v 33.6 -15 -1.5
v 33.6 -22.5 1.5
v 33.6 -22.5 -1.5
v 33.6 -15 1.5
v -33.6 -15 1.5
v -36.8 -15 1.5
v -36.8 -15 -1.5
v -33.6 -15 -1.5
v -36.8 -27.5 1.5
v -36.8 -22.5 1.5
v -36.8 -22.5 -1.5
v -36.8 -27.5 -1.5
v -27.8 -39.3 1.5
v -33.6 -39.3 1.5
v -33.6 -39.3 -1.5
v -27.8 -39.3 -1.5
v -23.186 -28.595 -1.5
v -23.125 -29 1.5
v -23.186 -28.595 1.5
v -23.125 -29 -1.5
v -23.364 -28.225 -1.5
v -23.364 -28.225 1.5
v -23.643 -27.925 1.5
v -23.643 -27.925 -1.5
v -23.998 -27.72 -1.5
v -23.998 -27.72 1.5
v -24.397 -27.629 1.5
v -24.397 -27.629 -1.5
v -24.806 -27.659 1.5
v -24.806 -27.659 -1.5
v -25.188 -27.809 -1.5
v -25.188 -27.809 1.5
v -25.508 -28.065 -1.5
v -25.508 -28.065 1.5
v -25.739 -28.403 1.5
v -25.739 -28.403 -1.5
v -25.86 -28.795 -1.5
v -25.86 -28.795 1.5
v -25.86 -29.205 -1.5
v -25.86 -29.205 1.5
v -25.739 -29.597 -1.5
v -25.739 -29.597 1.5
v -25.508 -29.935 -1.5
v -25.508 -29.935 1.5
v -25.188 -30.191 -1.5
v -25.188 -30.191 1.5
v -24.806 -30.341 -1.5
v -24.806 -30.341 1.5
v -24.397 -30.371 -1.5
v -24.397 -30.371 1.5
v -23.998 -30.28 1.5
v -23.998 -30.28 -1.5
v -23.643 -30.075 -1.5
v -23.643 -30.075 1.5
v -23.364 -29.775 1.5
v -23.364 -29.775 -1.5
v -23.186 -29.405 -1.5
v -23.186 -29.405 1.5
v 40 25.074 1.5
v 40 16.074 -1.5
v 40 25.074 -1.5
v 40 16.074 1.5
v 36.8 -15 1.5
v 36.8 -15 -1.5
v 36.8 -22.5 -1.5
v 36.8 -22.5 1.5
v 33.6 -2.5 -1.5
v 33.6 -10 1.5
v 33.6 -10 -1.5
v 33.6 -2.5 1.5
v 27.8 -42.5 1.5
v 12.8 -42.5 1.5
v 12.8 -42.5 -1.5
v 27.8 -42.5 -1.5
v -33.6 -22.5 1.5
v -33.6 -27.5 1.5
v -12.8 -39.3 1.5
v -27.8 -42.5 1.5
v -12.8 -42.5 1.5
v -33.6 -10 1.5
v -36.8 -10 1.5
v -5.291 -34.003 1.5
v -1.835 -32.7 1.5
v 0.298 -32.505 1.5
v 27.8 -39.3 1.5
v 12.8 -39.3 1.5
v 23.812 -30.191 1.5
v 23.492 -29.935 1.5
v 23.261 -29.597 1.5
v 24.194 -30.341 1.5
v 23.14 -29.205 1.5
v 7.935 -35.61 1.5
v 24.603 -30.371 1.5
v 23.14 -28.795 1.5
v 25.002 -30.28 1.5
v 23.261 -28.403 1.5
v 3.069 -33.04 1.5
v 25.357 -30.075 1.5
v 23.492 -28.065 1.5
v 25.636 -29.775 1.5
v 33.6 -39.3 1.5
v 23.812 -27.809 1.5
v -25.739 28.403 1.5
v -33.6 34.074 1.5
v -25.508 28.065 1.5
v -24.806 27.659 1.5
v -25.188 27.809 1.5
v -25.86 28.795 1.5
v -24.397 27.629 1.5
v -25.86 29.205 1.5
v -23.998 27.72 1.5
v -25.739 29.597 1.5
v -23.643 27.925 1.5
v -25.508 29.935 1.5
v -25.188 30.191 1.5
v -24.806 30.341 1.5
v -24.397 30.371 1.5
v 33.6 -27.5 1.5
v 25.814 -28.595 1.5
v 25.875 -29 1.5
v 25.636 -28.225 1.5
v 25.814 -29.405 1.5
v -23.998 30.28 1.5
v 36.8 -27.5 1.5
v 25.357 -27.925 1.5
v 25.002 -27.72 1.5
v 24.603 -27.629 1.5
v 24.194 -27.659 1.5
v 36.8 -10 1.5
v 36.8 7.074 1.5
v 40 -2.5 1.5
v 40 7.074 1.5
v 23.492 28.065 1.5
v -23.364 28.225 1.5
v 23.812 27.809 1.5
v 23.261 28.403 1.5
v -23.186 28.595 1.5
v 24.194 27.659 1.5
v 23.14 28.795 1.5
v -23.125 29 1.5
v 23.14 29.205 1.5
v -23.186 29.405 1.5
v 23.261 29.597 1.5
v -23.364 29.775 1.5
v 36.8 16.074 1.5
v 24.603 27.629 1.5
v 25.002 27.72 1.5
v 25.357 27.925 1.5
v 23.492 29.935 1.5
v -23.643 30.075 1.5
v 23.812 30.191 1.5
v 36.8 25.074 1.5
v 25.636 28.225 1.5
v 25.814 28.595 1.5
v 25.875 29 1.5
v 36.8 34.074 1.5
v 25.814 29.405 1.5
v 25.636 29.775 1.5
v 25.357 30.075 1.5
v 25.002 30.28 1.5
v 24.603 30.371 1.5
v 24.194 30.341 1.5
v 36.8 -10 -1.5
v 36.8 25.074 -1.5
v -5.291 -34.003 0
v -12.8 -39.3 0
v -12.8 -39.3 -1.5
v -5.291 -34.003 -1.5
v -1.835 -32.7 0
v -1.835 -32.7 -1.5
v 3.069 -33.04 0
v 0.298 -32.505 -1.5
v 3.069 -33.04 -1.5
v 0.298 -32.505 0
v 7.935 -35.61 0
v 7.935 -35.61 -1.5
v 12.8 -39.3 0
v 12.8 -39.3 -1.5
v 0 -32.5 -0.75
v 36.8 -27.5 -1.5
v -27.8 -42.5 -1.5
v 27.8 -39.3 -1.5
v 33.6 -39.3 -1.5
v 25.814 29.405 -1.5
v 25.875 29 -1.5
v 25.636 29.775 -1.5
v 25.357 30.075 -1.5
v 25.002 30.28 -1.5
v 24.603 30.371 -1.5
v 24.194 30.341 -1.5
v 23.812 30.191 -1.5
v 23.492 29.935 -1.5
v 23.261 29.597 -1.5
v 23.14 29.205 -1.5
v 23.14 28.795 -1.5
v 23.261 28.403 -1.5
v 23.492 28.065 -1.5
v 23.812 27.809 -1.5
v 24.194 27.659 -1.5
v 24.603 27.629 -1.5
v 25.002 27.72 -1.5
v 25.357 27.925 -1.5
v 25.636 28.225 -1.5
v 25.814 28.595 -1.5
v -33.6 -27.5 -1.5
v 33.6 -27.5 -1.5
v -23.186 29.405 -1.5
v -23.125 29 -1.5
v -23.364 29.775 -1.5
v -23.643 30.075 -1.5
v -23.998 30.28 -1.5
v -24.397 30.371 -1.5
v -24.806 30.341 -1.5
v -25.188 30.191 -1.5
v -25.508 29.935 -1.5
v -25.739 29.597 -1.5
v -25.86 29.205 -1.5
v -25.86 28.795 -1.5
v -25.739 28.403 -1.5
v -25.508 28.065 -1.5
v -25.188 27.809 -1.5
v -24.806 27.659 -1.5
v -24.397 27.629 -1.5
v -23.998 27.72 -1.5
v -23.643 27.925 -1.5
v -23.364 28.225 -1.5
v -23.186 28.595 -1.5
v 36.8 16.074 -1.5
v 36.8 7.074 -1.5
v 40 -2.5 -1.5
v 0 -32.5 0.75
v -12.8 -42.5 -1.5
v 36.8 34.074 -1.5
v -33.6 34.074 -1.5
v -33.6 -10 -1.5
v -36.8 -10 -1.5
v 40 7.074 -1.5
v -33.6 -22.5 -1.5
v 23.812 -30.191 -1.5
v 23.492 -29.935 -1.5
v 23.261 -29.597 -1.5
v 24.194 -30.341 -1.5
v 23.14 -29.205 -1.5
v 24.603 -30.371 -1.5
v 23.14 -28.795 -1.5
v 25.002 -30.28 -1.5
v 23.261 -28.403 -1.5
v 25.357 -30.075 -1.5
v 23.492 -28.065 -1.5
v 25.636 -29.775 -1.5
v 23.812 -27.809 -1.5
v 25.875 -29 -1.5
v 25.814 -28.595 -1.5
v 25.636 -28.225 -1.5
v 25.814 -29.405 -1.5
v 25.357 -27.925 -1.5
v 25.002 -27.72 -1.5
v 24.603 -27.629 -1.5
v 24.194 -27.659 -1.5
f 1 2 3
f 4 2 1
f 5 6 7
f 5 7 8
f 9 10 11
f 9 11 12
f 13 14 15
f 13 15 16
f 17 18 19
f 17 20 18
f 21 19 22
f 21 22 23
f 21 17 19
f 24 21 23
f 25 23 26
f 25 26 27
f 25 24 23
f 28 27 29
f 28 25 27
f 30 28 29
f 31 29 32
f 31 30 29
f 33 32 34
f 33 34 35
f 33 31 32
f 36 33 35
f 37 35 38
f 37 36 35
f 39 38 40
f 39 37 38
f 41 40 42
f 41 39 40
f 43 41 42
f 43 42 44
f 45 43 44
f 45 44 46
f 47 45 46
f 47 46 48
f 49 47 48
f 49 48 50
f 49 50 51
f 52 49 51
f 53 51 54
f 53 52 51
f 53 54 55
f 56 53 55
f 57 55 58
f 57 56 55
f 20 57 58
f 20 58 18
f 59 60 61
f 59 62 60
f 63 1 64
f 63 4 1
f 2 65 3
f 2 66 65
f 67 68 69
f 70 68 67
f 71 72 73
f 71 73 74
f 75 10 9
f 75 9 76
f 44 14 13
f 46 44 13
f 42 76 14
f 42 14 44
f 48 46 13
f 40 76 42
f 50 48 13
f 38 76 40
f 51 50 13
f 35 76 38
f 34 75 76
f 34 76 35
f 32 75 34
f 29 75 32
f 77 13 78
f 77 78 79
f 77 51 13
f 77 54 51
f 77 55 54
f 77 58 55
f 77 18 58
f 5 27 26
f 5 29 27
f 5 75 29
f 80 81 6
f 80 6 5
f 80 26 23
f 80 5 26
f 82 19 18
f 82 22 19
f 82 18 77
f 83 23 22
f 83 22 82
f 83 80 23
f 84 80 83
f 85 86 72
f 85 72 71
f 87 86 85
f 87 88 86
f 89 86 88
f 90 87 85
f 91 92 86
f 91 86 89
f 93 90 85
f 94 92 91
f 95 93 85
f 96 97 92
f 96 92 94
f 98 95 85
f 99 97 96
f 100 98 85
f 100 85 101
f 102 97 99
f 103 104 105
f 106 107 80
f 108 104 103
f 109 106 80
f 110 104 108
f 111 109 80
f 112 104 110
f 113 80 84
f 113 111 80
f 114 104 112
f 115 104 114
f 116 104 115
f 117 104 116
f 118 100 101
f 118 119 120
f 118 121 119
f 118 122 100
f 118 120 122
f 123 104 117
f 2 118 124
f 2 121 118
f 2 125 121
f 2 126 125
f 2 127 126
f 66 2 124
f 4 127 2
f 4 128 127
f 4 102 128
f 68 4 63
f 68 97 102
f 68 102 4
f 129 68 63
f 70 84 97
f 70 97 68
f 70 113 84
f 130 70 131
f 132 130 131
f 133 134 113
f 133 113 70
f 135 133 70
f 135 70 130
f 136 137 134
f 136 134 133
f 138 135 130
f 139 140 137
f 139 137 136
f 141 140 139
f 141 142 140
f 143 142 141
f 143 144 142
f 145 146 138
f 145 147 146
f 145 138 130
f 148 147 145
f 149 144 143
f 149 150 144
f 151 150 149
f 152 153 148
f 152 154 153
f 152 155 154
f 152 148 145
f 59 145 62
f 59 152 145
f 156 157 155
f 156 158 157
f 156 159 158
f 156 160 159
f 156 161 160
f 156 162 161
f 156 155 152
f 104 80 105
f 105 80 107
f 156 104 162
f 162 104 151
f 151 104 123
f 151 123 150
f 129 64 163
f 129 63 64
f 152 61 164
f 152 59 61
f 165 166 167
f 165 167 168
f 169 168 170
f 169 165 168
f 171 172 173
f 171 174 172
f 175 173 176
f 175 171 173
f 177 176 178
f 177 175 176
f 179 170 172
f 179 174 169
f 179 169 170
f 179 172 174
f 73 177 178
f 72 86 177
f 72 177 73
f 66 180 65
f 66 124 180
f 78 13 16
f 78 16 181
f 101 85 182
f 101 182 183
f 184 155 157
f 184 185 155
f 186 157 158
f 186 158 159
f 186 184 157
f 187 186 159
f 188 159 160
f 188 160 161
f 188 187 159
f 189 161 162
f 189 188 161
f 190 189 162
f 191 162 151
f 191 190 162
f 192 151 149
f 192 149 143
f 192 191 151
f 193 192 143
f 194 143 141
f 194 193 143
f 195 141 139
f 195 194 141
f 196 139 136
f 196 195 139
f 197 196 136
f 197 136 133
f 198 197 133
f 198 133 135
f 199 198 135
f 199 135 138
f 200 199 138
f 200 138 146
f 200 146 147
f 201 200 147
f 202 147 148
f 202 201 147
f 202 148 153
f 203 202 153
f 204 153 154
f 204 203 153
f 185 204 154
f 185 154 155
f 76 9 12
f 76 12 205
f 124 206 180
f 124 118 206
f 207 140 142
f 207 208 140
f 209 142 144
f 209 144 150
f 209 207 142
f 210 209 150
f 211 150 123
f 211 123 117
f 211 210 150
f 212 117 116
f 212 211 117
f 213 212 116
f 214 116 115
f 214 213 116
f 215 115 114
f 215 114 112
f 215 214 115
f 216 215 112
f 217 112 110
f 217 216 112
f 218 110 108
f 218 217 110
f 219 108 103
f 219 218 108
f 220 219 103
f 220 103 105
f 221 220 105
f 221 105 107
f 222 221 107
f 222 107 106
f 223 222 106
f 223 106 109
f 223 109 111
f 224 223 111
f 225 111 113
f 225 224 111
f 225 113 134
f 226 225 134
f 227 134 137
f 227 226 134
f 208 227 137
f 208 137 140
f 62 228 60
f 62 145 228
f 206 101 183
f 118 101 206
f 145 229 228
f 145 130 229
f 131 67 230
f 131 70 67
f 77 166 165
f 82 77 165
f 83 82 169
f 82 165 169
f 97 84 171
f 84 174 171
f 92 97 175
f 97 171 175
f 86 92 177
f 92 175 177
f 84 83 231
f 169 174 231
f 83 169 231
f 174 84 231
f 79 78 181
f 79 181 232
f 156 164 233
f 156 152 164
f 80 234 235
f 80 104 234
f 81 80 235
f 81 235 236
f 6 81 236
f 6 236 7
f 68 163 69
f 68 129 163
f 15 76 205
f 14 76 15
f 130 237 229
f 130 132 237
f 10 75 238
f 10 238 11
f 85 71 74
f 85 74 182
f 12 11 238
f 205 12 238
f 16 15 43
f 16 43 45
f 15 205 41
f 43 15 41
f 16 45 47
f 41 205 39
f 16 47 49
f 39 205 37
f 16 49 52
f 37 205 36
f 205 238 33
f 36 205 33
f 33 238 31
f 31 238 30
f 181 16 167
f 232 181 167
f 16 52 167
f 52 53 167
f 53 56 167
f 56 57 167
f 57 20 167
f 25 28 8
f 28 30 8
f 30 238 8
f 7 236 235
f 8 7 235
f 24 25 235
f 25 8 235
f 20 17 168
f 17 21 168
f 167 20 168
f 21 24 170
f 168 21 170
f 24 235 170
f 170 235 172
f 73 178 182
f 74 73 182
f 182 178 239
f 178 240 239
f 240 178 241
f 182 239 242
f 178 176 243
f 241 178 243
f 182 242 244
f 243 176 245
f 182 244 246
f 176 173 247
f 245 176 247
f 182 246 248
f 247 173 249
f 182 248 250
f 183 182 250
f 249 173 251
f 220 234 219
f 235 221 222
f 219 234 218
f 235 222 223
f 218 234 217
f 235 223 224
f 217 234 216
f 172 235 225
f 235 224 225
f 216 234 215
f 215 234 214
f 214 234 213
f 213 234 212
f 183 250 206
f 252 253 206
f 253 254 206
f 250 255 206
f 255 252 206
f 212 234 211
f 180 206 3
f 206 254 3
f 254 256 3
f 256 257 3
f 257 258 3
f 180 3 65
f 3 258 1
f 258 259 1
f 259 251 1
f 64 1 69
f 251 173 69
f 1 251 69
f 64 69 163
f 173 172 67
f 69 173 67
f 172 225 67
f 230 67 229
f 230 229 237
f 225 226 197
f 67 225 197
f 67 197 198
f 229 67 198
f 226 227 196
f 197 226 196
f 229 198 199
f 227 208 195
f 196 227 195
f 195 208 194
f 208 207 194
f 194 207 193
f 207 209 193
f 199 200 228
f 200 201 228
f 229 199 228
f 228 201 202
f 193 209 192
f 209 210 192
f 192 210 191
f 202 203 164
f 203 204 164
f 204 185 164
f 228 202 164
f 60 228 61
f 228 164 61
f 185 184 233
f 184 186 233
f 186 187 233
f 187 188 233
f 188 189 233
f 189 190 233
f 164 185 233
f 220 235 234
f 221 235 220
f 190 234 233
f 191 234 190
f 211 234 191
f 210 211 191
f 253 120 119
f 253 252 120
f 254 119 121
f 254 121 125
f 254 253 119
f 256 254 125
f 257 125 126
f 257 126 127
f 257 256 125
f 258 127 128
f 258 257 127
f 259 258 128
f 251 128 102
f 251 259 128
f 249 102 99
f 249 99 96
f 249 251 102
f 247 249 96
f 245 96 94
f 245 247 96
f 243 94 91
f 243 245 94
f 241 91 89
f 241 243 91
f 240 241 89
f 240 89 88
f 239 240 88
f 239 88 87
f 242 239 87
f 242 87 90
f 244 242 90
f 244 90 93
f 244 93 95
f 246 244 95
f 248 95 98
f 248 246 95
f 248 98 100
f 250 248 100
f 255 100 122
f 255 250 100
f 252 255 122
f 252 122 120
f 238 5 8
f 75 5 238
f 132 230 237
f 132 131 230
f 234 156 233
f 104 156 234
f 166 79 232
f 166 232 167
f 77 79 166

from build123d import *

# Parameters (mm, degrees)
F0_R     = 1.375
F1_DEPTH = 1.5


with BuildPart() as f1:
    # F0 (on Top) → F1 (new body, symmetric)
    with BuildSketch(Plane.XY):
        with BuildLine():
            Line((33.6, 34.073957), (27.8, 34.073957))
            Line((27.8, 34.073957), (-27.8, 34.073957))
            Line((-27.8, 34.073957), (-33.6, 34.073957))
            Line((-33.6, 34.073957), (-33.6, -10))
            Line((-33.6, -10), (-36.8, -10))
            Line((-36.8, -10), (-36.8, -15))
            Line((-36.8, -15), (-33.6, -15))
            Line((-33.6, -15), (-33.6, -22.5))
            Line((-33.6, -22.5), (-36.8, -22.5))
            Line((-36.8, -22.5), (-36.8, -27.5))
            Line((-36.8, -27.5), (-33.6, -27.5))
            Line((-33.6, -27.5), (-33.6, -39.3))
            Line((-33.6, -39.3), (-27.8, -39.3))
            Line((-27.8, -39.3), (-27.8, -42.5))
            Line((-27.8, -42.5), (-12.8, -42.5))
            Line((-12.8, -42.5), (-12.8, -39.3))
            add(Edge.make_bspline(
                [(-12.8, -39.3), (-8.533333, -35.9), (0, -29.1), (8.533333, -35.9), (12.8, -39.3)],
                knots=[0, 0, 0, 0, 14.494137, 28.988273, 28.988273, 28.988273, 28.988273], degree=3))
            Line((12.8, -39.3), (12.8, -42.5))
            Line((12.8, -42.5), (27.8, -42.5))
            Line((27.8, -42.5), (27.8, -39.3))
            Line((27.8, -39.3), (33.6, -39.3))
            Line((33.6, -39.3), (33.6, -27.5))
            Line((33.6, -27.5), (36.8, -27.5))
            Line((36.8, -27.5), (36.8, -22.5))
            Line((36.8, -22.5), (33.6, -22.5))
            Line((33.6, -22.5), (33.6, -15))
            Line((33.6, -15), (36.8, -15))
            Line((36.8, -15), (36.8, -10))
            Line((36.8, -10), (33.6, -10))
            Line((33.6, -10), (33.6, -2.5))
            Line((33.6, -2.5), (36.8, -2.5))
            Line((36.8, -2.5), (40, -2.5))
            Line((40, -2.5), (40, 7.073957))
            Line((40, 7.073957), (36.8, 7.073957))
            Line((36.8, 7.073957), (36.8, 16.073957))
            Line((36.8, 16.073957), (40, 16.073957))
            Line((40, 16.073957), (40, 25.073957))
            Line((40, 25.073957), (36.8, 25.073957))
            Line((36.8, 25.073957), (36.8, 34.073957))
            Line((36.8, 34.073957), (33.6, 34.073957))
        make_face()
        with Locations((-24.5, -29)):
            Circle(F0_R, mode=Mode.SUBTRACT)
        with Locations((24.5, -29)):
            Circle(F0_R, mode=Mode.SUBTRACT)
        with Locations((-24.5, 29)):
            Circle(F0_R, mode=Mode.SUBTRACT)
        with Locations((24.5, 29)):
            Circle(F0_R, mode=Mode.SUBTRACT)
    extrude(amount=F1_DEPTH, both=True)


solid = f1.part
